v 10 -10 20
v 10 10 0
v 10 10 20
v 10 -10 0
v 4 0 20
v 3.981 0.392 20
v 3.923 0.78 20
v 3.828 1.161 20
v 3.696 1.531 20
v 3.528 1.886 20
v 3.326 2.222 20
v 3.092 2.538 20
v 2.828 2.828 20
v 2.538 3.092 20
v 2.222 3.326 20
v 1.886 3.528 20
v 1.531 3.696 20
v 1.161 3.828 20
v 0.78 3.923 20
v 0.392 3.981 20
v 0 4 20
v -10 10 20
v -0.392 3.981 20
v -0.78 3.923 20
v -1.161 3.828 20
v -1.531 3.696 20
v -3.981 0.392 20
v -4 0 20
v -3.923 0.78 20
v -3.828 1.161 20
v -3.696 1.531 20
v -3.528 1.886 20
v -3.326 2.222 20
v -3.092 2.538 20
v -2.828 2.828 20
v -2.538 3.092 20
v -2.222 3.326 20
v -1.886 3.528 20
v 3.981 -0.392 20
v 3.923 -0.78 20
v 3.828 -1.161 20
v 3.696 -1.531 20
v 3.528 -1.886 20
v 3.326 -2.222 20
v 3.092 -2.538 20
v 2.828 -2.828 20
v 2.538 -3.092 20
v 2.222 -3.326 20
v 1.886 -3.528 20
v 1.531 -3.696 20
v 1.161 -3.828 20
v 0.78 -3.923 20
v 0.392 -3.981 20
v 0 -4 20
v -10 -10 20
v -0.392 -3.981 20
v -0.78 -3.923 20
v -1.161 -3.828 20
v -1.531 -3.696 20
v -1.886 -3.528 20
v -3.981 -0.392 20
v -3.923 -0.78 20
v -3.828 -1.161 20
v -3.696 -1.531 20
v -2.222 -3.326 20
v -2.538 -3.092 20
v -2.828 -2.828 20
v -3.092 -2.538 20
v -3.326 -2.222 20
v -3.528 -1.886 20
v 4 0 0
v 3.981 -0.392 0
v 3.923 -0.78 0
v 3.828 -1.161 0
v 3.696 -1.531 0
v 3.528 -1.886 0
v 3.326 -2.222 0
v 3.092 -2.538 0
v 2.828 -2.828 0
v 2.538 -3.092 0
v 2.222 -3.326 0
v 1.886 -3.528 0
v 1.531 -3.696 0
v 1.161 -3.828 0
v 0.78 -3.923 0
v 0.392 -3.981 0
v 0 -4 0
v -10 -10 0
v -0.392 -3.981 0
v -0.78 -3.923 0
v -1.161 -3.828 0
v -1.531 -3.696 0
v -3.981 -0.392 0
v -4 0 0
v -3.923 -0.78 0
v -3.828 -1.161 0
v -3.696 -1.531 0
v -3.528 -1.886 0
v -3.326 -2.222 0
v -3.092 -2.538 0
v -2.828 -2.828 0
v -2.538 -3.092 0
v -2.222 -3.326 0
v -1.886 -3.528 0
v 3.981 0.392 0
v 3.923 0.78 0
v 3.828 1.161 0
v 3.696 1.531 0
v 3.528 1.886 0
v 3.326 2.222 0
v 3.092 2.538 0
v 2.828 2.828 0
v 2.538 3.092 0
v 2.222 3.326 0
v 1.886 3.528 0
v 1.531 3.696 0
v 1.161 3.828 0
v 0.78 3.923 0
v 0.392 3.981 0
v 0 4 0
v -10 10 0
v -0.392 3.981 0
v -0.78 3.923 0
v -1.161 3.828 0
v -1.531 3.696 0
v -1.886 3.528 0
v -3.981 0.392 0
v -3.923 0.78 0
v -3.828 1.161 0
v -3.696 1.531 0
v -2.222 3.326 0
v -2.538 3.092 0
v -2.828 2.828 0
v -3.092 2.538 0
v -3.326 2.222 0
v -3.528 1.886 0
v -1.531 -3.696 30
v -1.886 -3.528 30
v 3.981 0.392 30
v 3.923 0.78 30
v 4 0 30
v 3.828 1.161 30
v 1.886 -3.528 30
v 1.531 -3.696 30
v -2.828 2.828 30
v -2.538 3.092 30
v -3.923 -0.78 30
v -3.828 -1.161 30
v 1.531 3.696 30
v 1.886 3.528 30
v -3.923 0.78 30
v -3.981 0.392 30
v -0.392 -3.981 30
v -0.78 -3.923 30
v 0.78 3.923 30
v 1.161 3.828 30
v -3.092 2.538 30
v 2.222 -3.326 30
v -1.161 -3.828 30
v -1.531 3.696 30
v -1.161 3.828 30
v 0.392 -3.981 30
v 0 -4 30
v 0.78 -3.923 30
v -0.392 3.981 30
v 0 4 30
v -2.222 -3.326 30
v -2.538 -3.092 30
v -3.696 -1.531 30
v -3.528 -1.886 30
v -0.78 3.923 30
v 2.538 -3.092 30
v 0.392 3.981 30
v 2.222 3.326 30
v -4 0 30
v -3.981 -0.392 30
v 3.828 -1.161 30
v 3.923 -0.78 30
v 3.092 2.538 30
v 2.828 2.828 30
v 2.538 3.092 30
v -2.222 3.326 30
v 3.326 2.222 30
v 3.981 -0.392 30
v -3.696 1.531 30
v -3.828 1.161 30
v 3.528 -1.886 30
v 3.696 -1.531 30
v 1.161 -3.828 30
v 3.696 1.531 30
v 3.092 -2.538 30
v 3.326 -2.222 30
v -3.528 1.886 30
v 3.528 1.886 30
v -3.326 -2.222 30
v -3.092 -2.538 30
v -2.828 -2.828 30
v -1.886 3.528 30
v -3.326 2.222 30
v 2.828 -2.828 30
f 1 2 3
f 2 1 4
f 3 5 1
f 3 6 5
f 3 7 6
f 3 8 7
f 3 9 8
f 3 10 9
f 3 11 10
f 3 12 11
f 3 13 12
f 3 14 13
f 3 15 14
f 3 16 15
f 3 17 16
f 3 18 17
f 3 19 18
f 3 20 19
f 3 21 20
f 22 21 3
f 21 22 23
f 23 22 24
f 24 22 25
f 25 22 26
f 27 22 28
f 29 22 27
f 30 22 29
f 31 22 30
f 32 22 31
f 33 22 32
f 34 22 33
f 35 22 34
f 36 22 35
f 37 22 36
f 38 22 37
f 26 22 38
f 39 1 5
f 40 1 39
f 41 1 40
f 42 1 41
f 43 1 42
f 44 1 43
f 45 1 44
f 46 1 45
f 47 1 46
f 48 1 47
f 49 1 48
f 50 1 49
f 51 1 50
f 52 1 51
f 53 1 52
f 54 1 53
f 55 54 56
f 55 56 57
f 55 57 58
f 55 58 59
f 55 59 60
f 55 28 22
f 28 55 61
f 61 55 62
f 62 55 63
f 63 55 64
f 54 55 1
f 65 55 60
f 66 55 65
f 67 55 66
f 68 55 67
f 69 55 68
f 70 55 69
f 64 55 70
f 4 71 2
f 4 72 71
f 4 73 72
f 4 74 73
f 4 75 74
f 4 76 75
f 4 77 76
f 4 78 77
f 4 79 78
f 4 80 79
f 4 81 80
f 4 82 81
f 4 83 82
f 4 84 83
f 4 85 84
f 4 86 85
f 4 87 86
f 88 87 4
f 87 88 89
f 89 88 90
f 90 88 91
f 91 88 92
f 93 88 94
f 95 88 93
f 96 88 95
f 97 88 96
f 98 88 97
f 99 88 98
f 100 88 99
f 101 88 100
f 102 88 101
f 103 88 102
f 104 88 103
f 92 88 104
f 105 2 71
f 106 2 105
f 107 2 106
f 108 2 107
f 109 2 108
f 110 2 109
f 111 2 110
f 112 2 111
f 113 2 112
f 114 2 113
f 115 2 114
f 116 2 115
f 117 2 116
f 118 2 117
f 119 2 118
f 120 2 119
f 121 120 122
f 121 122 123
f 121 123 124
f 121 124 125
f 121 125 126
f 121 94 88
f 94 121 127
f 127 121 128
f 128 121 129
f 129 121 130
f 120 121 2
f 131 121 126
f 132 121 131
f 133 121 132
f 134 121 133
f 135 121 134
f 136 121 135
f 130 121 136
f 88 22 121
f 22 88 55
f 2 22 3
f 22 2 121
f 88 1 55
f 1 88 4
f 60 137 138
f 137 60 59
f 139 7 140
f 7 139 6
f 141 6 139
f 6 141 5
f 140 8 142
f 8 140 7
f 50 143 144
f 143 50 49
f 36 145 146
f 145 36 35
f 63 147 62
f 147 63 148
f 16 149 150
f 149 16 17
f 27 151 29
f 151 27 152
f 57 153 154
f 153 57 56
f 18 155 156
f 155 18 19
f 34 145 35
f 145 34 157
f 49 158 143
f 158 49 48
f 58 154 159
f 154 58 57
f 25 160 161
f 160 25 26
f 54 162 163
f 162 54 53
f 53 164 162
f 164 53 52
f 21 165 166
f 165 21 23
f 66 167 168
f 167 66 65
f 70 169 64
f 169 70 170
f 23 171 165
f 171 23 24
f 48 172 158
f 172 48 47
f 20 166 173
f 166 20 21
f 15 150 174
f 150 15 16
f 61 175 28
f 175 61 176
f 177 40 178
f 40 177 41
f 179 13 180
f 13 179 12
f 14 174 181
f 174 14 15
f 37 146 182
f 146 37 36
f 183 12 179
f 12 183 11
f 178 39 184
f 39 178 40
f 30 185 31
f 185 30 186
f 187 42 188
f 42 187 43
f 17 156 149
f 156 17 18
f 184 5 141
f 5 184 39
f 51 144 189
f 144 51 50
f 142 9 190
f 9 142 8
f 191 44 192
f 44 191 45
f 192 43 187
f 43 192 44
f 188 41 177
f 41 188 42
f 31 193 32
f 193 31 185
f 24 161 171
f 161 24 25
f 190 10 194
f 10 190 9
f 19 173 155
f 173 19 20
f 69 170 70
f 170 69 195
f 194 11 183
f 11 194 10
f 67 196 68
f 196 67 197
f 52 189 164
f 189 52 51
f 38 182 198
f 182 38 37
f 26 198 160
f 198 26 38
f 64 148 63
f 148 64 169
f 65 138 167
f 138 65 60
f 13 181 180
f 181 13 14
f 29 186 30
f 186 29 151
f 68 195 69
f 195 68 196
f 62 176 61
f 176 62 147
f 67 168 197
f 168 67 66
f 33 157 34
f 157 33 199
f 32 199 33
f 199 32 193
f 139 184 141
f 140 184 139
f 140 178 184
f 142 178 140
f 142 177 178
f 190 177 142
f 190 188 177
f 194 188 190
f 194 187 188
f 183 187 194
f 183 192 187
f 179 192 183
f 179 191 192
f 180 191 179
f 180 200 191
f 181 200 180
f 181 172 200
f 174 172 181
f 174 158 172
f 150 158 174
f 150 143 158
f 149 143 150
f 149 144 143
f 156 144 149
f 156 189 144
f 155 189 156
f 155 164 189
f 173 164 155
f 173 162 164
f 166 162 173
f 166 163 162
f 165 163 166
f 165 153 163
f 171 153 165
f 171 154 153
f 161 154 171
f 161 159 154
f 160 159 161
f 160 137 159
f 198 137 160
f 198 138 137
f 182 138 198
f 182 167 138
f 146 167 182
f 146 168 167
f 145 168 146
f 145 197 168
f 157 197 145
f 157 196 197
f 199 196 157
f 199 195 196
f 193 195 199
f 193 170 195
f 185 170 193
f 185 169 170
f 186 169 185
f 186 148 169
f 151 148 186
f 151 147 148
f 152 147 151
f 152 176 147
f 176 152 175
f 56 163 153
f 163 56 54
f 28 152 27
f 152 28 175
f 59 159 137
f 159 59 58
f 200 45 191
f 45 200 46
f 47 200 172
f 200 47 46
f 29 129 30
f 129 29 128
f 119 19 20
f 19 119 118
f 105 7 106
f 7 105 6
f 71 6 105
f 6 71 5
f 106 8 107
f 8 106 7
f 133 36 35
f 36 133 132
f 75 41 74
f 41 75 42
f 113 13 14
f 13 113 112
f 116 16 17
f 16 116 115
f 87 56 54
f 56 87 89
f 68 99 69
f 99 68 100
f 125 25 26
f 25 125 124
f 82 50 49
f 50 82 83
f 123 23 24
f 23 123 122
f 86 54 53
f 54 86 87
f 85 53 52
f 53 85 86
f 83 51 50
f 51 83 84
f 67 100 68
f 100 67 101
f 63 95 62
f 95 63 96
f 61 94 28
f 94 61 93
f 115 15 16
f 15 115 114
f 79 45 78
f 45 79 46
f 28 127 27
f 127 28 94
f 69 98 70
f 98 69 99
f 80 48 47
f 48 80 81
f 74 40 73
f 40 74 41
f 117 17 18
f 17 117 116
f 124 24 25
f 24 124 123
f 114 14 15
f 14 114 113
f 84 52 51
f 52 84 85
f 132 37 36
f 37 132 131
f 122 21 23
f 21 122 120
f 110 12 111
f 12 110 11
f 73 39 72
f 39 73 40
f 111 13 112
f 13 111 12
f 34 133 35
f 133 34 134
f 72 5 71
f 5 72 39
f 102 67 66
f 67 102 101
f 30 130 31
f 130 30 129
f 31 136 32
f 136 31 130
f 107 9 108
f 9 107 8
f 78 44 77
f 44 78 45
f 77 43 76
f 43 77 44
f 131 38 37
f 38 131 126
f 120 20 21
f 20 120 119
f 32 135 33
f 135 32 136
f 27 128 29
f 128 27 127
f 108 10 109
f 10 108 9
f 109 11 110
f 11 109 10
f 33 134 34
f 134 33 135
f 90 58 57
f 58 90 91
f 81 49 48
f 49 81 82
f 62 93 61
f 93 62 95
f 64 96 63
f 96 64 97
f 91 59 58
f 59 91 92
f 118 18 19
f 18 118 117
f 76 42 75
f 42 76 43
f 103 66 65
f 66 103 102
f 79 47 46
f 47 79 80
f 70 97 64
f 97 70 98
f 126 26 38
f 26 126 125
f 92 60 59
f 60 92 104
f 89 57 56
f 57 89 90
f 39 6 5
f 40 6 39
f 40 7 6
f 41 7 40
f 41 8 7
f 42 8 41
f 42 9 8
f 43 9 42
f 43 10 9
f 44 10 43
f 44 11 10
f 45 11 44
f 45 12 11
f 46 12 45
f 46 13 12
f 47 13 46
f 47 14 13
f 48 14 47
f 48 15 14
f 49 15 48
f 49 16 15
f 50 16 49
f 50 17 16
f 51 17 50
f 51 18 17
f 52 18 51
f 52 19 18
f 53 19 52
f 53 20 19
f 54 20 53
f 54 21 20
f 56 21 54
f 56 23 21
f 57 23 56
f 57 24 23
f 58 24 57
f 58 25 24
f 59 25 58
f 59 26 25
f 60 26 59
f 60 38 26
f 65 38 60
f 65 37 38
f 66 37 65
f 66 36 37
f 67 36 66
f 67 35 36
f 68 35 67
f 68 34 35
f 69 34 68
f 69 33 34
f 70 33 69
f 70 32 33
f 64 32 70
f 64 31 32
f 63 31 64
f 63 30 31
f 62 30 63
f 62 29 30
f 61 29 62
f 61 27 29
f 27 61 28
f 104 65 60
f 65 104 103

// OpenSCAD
module shaft_support_bracket() {
    difference() {
        union() {
            // Base block
            translate([-10, -10, 0])
                cube([20, 20, 20]);
            // Rod hole
            translate([0, 0, 10])
                cylinder(h=20, r=4, $fn=64);
        }
        // Cutout for the rod
        translate([0, 0, 0])
            cylinder(h=20, r=4, $fn=64);
    }
}

shaft_support_bracket();
